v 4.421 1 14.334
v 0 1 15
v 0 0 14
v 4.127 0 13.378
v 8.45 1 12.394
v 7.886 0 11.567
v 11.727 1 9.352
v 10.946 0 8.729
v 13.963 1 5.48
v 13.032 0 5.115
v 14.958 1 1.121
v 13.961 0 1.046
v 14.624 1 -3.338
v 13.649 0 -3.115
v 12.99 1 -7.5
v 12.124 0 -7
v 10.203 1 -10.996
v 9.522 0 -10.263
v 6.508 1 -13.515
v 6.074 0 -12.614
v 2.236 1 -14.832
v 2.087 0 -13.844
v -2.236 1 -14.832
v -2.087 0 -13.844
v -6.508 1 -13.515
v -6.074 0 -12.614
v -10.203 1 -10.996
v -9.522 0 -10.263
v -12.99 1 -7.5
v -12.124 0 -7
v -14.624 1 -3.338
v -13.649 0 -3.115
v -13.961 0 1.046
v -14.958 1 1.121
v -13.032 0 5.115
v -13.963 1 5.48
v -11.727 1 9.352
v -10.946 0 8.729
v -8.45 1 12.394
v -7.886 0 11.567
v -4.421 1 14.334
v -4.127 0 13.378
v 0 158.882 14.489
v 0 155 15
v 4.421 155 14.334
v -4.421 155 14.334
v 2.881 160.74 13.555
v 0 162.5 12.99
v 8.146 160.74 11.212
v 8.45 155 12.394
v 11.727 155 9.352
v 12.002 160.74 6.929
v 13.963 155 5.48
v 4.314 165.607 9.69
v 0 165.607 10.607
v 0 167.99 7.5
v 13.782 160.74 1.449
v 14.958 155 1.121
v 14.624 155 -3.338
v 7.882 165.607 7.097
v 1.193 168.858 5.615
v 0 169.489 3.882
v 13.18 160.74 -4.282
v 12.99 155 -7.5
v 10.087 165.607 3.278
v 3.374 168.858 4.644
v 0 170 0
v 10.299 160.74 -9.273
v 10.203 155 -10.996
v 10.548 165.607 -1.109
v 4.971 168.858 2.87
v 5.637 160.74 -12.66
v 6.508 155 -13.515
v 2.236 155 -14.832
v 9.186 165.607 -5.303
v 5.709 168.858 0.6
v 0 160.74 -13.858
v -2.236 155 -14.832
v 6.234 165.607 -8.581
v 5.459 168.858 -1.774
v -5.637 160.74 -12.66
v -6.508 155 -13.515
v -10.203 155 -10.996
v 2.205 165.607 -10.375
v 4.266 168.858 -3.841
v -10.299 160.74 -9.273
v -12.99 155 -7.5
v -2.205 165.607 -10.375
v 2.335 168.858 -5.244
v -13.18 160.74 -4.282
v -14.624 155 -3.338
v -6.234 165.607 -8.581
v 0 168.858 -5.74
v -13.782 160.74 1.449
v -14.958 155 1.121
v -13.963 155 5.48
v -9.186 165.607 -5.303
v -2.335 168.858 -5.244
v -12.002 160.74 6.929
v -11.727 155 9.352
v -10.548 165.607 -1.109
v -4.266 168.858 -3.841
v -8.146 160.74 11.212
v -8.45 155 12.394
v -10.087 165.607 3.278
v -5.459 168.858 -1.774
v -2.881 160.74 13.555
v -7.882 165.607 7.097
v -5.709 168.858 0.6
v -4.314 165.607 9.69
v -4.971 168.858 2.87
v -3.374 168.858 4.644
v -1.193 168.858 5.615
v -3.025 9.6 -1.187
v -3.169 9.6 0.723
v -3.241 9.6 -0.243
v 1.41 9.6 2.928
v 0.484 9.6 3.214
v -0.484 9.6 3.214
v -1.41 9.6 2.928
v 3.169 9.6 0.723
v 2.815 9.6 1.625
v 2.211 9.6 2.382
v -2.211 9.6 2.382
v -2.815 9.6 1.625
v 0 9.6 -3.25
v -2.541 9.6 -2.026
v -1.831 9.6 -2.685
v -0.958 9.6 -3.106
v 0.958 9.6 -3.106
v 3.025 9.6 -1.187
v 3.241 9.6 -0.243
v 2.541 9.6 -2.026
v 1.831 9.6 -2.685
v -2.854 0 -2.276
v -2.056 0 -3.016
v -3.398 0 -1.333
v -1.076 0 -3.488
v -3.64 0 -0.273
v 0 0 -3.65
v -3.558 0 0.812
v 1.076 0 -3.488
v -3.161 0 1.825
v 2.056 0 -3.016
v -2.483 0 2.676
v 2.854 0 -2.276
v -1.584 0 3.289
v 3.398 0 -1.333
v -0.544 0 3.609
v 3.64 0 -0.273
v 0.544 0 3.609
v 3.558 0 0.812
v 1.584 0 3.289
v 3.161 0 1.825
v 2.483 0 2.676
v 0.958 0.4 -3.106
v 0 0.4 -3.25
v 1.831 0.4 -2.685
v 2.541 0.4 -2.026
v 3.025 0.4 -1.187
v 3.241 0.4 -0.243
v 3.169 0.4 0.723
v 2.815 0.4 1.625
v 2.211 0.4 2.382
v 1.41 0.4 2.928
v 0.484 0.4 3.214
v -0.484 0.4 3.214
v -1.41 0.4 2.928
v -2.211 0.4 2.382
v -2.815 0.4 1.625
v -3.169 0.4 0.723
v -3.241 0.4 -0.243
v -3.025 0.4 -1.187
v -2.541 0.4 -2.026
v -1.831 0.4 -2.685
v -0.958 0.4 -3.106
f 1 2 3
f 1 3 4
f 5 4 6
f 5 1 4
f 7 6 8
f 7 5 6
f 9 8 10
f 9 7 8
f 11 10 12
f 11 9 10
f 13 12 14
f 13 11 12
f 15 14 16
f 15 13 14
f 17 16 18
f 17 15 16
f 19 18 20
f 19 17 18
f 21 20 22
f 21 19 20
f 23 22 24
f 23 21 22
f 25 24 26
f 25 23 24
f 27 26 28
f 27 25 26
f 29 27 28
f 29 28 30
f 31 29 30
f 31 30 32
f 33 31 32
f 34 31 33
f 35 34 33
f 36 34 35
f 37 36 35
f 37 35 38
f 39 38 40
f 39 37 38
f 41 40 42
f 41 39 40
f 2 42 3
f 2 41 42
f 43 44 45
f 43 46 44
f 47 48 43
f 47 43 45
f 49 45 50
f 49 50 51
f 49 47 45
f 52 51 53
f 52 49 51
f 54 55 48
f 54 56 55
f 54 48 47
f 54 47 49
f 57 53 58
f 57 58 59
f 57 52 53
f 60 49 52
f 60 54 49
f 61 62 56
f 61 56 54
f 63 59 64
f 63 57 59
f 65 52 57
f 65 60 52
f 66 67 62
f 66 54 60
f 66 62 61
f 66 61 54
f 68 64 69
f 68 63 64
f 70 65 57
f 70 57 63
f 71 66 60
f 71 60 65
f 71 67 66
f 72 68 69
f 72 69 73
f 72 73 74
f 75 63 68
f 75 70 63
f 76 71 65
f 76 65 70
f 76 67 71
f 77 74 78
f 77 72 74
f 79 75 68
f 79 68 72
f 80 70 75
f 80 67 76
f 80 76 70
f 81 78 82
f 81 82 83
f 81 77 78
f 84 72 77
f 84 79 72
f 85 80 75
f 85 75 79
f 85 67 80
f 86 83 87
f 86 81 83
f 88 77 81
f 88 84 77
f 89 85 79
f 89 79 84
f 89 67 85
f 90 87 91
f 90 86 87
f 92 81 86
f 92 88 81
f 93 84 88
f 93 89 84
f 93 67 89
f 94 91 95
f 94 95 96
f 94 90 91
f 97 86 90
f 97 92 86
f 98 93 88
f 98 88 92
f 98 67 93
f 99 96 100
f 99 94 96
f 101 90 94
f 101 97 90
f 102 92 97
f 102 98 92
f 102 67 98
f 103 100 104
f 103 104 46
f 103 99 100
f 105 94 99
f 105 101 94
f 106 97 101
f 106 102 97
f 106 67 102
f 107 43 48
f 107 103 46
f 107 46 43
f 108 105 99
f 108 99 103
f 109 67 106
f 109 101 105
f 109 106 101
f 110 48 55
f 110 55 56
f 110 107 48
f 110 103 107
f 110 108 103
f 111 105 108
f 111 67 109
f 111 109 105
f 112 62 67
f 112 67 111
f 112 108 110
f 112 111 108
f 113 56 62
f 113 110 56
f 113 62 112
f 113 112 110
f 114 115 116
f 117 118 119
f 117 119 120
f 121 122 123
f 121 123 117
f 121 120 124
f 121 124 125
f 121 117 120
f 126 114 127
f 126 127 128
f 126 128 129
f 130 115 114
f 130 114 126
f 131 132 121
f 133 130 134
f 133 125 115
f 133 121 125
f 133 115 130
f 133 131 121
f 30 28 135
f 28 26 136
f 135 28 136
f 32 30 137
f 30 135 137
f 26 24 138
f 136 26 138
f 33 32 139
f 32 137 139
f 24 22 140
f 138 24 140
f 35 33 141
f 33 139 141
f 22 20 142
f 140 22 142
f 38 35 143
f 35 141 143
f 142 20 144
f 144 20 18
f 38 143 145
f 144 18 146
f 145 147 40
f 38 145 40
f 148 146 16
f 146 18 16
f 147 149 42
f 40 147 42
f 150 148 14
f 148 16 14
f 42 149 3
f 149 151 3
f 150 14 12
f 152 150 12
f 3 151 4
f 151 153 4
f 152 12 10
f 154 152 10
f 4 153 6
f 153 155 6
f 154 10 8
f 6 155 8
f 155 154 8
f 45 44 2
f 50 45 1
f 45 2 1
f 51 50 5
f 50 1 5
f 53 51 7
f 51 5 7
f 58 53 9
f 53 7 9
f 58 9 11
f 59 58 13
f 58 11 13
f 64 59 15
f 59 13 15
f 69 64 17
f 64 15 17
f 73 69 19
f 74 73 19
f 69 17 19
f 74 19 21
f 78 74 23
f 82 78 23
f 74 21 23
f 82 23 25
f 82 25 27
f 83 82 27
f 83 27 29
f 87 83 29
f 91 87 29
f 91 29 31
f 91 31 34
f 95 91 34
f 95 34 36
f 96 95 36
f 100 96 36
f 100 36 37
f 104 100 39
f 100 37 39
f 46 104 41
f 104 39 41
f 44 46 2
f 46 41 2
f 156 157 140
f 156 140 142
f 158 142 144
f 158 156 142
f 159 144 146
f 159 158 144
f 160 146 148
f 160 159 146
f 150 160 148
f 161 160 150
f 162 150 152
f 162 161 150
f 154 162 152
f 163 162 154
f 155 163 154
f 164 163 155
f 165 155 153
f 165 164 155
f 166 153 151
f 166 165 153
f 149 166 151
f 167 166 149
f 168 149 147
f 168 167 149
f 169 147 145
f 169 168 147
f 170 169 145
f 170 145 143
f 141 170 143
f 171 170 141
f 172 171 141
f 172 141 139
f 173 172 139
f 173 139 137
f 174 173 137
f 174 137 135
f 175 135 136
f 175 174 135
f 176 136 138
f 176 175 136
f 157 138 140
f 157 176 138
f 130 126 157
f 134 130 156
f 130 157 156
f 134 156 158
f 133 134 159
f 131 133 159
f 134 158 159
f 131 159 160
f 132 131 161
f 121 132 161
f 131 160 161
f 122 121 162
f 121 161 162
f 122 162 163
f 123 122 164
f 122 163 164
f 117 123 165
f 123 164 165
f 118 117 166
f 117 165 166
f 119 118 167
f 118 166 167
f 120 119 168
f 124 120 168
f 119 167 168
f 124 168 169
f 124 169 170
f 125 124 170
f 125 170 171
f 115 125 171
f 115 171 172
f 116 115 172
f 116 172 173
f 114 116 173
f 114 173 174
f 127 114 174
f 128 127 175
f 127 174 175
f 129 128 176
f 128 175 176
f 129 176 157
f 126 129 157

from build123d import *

# Parameters (mm, degrees)
SKETCH1_R           = 15
BOSS_EXTRUDE1_DEPTH = 170
FILLET1_R           = 15
SKETCH2_R           = 3.25
CUT_EXTRUDE1_DEPTH  = 9.6
CHAMFER1_SIZE       = 0.4
CHAMFER2_SIZE       = 1


with BuildPart() as part:
    # Sketch1 → Boss-Extrude1 (new body)
    with BuildSketch(Plane(origin=(0, 0, 0), x_dir=(1, 0, 0), z_dir=(0, 1, 0))):
        with Locations(Location((0, 0, 0), (0, 0, 270))):
            Circle(SKETCH1_R)
    extrude(amount=BOSS_EXTRUDE1_DEPTH)

    # Fillet1
    fillet1_edges = [part.edges().sort_by_distance(p)[0] for p in [
        (0, 170, -15),
    ]]
    fillet(fillet1_edges, radius=FILLET1_R)

    # Sketch2 → Cut-Extrude1 (cut)
    with BuildSketch(Plane.XZ):
        with Locations(Location((0, 0, 0), (0, 0, 270))):
            Circle(SKETCH2_R)
    extrude(amount=-CUT_EXTRUDE1_DEPTH, mode=Mode.SUBTRACT)

    # Chamfer1
    chamfer1_edges = [part.edges().sort_by_distance(p)[0] for p in [
        (0, 0, 3.25),
    ]]
    chamfer(chamfer1_edges, length=CHAMFER1_SIZE)

    # Chamfer2
    chamfer2_edges = [part.edges().sort_by_distance(p)[0] for p in [
        (0, 0, -15),
    ]]
    chamfer(chamfer2_edges, length=CHAMFER2_SIZE)


solid = part.part
